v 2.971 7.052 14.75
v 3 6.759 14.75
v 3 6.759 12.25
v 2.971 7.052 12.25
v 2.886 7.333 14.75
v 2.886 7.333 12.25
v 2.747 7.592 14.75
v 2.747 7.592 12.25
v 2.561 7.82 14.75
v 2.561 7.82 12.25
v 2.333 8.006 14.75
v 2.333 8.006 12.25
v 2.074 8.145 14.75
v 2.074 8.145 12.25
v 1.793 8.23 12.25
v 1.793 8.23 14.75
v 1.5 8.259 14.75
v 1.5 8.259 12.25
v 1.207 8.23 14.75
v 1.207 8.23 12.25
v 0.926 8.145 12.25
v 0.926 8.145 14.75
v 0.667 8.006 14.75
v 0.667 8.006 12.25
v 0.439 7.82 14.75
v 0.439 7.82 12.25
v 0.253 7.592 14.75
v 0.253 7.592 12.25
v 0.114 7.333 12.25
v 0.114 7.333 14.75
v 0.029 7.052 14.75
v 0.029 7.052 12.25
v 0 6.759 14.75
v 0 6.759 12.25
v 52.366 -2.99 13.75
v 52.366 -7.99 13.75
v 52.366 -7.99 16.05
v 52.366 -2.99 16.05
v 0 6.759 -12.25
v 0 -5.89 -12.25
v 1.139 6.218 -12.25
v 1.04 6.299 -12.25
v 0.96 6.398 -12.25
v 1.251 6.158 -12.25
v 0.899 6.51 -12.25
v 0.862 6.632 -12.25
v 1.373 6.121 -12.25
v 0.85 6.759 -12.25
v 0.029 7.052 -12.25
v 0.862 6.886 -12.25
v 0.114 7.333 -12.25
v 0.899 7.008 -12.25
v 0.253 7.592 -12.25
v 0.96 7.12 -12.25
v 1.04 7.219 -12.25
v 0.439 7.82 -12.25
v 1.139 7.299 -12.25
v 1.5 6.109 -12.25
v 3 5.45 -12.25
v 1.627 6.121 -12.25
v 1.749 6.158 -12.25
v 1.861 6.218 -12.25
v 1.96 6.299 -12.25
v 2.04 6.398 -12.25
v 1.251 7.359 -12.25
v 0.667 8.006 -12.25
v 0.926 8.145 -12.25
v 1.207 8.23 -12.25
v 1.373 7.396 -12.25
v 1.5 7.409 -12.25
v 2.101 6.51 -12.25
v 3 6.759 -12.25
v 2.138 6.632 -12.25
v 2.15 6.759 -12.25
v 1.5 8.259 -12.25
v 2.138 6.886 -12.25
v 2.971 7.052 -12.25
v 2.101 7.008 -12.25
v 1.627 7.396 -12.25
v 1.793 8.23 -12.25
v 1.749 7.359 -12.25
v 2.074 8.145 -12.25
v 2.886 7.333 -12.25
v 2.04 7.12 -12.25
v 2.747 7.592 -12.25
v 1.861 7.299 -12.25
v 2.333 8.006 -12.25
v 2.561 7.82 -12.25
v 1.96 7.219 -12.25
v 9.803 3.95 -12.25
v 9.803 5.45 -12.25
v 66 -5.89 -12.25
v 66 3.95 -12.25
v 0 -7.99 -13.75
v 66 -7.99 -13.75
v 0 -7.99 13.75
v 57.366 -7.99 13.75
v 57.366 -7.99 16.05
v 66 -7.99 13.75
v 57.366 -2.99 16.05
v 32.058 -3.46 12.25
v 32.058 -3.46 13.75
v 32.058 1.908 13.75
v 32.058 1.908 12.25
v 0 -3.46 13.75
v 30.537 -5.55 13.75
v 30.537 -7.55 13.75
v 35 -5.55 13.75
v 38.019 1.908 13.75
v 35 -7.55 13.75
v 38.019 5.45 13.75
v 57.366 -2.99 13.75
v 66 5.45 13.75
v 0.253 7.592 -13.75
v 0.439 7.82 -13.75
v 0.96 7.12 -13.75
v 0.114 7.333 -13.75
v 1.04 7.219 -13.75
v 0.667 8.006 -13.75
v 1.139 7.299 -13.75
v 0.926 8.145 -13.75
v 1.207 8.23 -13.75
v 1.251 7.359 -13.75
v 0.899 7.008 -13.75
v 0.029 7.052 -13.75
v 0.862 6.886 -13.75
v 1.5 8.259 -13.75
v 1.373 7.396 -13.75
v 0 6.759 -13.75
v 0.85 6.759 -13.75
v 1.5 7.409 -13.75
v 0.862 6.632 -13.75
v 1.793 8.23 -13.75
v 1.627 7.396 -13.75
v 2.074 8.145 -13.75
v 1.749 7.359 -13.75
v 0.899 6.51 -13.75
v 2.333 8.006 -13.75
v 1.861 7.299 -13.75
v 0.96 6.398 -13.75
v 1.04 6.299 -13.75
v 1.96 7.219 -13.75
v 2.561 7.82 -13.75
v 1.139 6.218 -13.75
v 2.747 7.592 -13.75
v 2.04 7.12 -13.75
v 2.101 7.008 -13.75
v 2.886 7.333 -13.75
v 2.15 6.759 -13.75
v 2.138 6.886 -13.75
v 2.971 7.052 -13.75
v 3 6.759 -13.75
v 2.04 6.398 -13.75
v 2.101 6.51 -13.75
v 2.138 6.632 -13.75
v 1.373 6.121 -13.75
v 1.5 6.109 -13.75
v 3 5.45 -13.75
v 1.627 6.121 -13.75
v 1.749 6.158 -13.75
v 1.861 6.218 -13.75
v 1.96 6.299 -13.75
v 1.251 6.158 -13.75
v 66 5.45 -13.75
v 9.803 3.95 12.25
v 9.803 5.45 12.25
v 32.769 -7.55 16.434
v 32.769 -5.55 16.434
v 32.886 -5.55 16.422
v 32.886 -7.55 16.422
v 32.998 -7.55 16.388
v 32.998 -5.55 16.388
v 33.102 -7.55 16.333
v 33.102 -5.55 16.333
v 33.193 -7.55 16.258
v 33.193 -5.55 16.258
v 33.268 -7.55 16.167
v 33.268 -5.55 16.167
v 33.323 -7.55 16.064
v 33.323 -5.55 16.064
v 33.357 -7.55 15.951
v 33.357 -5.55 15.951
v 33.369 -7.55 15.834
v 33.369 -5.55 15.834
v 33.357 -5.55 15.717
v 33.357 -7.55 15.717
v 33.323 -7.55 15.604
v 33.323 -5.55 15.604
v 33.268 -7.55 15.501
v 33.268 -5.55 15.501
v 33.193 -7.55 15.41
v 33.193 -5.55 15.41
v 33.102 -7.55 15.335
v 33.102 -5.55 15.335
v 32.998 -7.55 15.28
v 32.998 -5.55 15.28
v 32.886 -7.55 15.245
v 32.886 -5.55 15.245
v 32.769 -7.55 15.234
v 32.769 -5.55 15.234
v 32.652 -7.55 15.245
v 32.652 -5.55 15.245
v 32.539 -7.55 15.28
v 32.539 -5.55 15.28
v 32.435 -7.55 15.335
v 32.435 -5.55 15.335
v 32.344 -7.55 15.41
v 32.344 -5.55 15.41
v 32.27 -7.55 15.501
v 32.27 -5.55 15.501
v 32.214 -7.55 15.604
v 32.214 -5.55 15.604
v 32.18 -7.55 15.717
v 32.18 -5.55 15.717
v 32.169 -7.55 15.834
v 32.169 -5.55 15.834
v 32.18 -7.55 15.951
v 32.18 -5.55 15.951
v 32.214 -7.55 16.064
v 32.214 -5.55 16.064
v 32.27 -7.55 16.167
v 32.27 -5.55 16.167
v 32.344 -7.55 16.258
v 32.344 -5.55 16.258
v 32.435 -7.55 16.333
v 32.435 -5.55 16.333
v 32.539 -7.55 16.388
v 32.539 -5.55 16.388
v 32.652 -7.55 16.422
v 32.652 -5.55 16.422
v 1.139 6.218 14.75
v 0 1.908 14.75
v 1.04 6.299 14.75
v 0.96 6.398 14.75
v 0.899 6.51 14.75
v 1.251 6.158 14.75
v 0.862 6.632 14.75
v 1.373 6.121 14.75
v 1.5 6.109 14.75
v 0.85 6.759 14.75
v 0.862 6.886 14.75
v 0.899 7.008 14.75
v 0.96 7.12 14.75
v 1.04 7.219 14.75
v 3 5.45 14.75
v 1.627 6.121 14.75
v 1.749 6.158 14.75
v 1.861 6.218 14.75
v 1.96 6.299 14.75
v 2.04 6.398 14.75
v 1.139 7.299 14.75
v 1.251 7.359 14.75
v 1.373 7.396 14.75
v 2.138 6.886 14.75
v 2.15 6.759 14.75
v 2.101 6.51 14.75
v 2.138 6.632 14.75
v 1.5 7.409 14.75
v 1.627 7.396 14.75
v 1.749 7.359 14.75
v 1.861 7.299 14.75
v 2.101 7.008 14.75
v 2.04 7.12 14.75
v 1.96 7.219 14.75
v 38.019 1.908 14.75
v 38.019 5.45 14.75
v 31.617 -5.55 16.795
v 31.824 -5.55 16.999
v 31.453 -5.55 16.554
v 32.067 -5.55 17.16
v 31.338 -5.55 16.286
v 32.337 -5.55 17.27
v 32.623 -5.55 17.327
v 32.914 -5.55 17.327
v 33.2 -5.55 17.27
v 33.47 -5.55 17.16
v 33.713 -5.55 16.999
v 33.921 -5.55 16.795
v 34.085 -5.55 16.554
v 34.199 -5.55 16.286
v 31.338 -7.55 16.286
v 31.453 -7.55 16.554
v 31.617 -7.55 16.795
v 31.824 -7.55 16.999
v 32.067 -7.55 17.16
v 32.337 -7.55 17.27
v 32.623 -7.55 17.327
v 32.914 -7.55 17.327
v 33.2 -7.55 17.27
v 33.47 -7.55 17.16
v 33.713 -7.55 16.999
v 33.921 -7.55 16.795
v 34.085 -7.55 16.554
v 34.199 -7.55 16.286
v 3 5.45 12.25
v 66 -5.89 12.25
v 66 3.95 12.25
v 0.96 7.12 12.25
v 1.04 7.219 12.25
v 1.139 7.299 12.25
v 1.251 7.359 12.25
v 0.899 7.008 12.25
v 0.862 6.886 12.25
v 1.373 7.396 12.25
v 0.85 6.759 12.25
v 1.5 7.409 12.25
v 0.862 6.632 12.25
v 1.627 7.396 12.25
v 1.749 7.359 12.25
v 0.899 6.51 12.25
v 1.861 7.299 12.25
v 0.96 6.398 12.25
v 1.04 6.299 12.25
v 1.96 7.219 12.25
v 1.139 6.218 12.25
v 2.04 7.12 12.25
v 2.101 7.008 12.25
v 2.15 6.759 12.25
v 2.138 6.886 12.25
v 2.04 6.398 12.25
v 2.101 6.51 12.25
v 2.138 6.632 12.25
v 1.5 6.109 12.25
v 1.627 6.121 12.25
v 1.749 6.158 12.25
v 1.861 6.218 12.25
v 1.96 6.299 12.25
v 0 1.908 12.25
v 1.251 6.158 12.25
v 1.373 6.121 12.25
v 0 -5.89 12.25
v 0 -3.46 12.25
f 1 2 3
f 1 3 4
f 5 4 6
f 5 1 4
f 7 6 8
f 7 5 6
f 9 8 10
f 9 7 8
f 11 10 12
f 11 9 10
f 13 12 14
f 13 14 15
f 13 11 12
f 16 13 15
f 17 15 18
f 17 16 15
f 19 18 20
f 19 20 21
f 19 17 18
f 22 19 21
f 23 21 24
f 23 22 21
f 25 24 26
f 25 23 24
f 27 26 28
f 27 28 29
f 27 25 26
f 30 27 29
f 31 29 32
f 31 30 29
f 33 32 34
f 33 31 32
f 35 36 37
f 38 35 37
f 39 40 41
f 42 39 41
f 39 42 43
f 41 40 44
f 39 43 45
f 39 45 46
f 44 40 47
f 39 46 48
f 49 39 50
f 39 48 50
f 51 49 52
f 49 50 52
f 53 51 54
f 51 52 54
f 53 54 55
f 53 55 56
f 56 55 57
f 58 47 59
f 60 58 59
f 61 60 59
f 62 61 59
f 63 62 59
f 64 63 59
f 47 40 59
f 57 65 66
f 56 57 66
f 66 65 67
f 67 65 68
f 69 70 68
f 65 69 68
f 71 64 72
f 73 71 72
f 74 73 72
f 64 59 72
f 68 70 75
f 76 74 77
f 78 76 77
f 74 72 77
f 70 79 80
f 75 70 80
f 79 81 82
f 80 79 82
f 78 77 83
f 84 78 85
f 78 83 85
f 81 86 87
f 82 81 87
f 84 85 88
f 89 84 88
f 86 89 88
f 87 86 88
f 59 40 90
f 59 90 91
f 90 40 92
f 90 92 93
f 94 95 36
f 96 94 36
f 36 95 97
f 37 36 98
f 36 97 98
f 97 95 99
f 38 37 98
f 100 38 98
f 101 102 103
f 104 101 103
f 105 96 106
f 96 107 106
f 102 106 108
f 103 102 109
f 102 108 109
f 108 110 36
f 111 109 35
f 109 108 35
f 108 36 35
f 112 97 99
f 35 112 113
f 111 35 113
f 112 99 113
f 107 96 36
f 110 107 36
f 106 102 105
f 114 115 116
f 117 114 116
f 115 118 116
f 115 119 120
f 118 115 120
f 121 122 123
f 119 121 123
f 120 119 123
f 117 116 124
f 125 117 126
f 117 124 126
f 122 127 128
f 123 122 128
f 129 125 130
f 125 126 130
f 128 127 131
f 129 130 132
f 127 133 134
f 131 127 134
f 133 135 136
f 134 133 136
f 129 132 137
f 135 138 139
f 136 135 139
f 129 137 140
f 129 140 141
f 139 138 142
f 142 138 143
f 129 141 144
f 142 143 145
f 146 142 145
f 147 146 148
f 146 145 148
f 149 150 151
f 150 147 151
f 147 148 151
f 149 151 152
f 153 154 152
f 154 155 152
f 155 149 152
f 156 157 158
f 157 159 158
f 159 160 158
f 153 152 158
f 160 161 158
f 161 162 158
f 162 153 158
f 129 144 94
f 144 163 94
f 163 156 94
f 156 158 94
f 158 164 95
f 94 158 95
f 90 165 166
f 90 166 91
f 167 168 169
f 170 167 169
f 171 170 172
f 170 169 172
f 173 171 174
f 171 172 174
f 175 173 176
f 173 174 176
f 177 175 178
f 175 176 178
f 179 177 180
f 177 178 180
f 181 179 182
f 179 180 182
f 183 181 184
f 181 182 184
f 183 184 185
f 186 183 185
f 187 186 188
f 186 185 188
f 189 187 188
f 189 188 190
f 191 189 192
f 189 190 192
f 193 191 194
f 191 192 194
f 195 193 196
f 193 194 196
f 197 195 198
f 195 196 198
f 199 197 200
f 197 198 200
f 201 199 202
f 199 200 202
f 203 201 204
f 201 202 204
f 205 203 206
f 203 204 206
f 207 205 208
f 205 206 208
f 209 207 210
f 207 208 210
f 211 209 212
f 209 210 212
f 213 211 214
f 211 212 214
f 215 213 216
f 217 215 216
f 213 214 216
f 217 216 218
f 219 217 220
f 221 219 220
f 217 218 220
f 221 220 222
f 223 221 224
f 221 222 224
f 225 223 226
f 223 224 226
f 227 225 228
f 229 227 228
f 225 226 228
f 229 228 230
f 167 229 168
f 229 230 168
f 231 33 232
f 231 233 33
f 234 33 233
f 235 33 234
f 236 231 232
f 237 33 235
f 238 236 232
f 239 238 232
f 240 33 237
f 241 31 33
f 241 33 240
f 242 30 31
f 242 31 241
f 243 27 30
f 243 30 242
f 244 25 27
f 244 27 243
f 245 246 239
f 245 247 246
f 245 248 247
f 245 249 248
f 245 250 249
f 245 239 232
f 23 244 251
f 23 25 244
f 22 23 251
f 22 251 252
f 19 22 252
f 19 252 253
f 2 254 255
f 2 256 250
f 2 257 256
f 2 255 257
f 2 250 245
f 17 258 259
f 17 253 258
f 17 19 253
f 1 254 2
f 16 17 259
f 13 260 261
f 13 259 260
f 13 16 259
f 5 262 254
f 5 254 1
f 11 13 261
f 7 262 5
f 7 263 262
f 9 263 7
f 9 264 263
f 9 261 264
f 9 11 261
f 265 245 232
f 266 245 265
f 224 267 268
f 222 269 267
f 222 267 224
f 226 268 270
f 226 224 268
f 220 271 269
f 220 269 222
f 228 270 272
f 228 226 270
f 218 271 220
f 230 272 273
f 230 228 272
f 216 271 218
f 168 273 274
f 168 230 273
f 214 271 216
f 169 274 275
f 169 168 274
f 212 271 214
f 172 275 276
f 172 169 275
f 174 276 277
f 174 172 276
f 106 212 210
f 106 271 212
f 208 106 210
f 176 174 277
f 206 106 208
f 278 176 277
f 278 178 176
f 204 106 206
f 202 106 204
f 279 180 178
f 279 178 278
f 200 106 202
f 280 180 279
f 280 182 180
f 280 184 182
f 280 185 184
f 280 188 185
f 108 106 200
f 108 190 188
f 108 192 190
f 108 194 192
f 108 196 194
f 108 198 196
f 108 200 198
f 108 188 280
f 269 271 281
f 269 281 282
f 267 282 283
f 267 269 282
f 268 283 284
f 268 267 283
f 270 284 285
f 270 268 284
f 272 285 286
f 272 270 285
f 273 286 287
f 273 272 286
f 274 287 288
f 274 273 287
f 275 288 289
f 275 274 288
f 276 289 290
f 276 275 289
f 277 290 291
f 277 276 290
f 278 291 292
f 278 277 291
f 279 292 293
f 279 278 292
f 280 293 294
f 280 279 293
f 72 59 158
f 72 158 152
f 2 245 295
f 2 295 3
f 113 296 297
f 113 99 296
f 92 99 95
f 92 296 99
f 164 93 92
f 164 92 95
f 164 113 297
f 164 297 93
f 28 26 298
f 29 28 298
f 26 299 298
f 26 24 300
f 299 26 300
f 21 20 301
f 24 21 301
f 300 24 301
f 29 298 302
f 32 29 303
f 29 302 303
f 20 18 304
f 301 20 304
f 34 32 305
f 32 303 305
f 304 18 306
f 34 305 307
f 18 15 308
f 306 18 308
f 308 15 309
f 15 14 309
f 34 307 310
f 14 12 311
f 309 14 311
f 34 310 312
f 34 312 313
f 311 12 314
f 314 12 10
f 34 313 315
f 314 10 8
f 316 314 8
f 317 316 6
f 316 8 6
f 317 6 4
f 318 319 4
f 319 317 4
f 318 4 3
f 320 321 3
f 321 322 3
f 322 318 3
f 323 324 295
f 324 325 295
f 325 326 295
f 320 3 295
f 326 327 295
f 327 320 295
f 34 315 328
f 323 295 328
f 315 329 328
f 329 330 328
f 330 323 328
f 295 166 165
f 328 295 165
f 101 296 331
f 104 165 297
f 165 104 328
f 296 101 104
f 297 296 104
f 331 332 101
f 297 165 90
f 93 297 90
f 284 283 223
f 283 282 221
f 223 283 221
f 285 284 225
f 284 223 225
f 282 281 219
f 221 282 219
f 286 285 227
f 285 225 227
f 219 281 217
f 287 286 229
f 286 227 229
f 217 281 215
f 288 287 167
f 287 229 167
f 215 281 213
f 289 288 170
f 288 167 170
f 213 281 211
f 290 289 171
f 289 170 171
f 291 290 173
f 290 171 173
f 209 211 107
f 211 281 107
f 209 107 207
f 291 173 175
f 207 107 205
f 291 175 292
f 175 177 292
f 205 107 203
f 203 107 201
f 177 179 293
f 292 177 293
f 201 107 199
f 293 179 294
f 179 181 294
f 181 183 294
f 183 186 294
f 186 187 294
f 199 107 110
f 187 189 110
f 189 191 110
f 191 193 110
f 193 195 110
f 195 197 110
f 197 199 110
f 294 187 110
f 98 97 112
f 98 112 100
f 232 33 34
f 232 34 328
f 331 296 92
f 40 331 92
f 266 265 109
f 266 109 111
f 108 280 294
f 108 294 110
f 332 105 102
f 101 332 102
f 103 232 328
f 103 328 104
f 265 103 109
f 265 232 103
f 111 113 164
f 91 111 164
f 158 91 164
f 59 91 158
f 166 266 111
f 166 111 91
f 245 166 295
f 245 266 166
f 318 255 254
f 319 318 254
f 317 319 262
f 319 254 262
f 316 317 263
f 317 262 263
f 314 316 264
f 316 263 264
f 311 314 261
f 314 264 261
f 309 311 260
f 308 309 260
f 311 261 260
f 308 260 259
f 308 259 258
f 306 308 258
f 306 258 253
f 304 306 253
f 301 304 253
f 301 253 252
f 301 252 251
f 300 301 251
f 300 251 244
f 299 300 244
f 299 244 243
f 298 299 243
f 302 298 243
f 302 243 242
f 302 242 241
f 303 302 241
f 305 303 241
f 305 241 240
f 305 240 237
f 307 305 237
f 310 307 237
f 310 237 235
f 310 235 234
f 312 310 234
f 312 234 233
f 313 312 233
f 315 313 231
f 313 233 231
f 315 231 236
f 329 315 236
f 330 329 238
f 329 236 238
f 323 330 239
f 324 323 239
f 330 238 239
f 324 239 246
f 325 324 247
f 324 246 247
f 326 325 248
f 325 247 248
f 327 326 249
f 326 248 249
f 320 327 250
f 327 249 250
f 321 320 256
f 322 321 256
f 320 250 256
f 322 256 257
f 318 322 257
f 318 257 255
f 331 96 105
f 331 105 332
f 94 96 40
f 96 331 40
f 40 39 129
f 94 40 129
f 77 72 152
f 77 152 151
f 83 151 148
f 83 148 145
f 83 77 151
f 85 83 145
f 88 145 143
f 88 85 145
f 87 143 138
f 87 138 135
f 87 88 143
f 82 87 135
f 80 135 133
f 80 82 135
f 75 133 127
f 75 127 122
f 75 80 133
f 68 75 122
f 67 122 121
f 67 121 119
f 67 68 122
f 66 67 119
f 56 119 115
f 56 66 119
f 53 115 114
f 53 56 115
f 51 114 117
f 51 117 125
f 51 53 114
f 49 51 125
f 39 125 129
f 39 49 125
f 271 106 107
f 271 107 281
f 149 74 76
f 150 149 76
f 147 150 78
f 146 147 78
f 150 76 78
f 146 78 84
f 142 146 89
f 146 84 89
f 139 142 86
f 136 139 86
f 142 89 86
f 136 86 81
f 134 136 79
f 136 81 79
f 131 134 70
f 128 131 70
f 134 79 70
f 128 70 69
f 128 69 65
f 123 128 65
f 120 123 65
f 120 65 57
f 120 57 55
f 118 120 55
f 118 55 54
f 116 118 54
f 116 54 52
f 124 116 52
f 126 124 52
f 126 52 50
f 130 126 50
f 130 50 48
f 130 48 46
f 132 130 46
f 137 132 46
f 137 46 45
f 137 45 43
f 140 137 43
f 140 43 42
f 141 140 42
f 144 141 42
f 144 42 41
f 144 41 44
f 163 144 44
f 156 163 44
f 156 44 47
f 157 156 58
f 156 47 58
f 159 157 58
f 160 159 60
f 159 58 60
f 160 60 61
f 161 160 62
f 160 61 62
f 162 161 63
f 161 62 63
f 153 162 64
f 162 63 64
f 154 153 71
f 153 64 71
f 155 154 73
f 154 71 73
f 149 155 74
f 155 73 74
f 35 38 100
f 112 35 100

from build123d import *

# Parameters (mm, degrees)
SKETCH_1_W               = 27.5
SKETCH_1_H               = 10.9
SKETCH_1_W_2             = 24.5
SKETCH_1_H_2             = 7.9
EXTRUDE_1_DEPTH          = 66
SKETCH_3_W               = 141.586461115
SKETCH_3_H               = 11.077241851
CUT_EXTRUDE_1_DEPTH      = 50
SKETCH_4_R               = 0.65
EXTRUDE_2_DEPTH          = 27.5
CUT_EXTRUDE_2_DEPTH      = 10
CUT_EXTRUDE_2_DEPTH_BACK = 10
SKETCH_5_W               = 27.947827097
SKETCH_5_H               = 24.5
EXTRUDE_3_DEPTH          = 66
EXTRUDE_START            = -11
SKETCH_9_R               = 0.6
EXTRUDE_5_DEPTH          = 2
SKETCH_10_W              = 33.442715753
SKETCH_10_H              = 5.368535072
CUT_EXTRUDE_3_DEPTH      = 2.6
SKETCH_11_W              = 5
SKETCH_11_H              = 2.3
EXTRUDE_6_DEPTH          = 5
EXTRUDE_START_2          = 1
SKETCH_12_R              = 0.65
EXTRUDE_7_DEPTH          = 1
SKETCH_13_W              = 24.5
SKETCH_13_H              = 0.6
EXTRUDE_8_DEPTH          = 66


with BuildPart() as part:
    # 草图1 → 凸台-拉伸1 (new body)
    with BuildSketch(Plane(origin=(0, 0, 0), x_dir=(0, 0, -1), z_dir=(1, 0, 0))):
        Rectangle(SKETCH_1_W, SKETCH_1_H)
        Rectangle(SKETCH_1_W_2, SKETCH_1_H_2, mode=Mode.SUBTRACT)
    extrude(amount=EXTRUDE_1_DEPTH)

    # 草图3 → 切除-拉伸1 (cut)
    with BuildSketch(Plane.XY.offset(13.75)):
        with Locations((67.57974516, -5.538620926)):
            Rectangle(SKETCH_3_W, SKETCH_3_H)
    extrude(amount=-CUT_EXTRUDE_1_DEPTH, mode=Mode.SUBTRACT)

    # 草图4 → 凸台-拉伸2 (add)
    with BuildSketch(Plane.XY.offset(13.75)):
        with BuildLine():
            Line((0, 6.758945139), (0, 5.45))
            Line((0, 5.45), (3, 5.45))
            Line((3, 5.45), (3, 6.758945139))
            ThreePointArc((3, 6.758945139), (1.5, 8.258945139), (0, 6.758945139))
        make_face()
        with Locations((1.5, 6.758945139)):
            Circle(SKETCH_4_R, mode=Mode.SUBTRACT)
    extrude(amount=-EXTRUDE_2_DEPTH)

    # 草图5 → 切除-拉伸2 (cut, two sides: drawn at the far end of the back side and taken through both)
    with BuildSketch(Plane(origin=(0, 5.45, 0), x_dir=(1, 0, 0), z_dir=(0, 1, 0)).offset(-CUT_EXTRUDE_2_DEPTH_BACK)):
        with Locations((-4.171370472, 0)):
            Rectangle(SKETCH_5_W, SKETCH_5_H)
    extrude(amount=CUT_EXTRUDE_2_DEPTH + CUT_EXTRUDE_2_DEPTH_BACK, mode=Mode.SUBTRACT)

    # 草图6 → 凸台-拉伸3 (add)
    with BuildSketch(Plane(origin=(66, 0, 0), x_dir=(0, 0, -1), z_dir=(1, 0, 0))):
        Polygon((-12.25, 0), (-12.25, -6.49), (12.25, -6.49), (12.25, 0), (13.75, 0), (13.75, -7.99), (-13.75, -7.99), (-13.75, 0), align=None)
    extrude(amount=-EXTRUDE_3_DEPTH)

    # 草图9 → 凸台-拉伸5 (add)
    with BuildSketch(Plane(origin=(0, 5.45, 0), x_dir=(1, 0, 0), z_dir=(0, 1, 0)).offset(EXTRUDE_START)):
        with BuildLine():
            Line((30.537348743, -13.75), (31.33833812, -16.285728508))
            ThreePointArc((31.33833812, -16.285728508), (32.768674372, -17.333911943), (34.199010623, -16.285728508))
            Line((34.199010623, -16.285728508), (35, -13.75))
            Line((35, -13.75), (30.537348743, -13.75))
        make_face()
        with Locations(Location((32.768674372, -15.833911943, 0), (0, 0, 270))):
            Circle(SKETCH_9_R, mode=Mode.SUBTRACT)
    extrude(amount=-EXTRUDE_5_DEPTH)

    # 草图10 → 切除-拉伸3 (cut)
    with BuildSketch(Plane.XY.offset(13.75)):
        with Locations((15.337072277, -0.775945513)):
            Rectangle(SKETCH_10_W, SKETCH_10_H)
    extrude(amount=-CUT_EXTRUDE_3_DEPTH, mode=Mode.SUBTRACT)

    # 草图11 → 凸台-拉伸6 (add)
    with BuildSketch(Plane.XZ.offset(7.99)):
        with Locations((54.86605626, 14.9)):
            Rectangle(SKETCH_11_W, SKETCH_11_H)
    extrude(amount=-EXTRUDE_6_DEPTH)

    # 草图12 → 凸台-拉伸7 (add)
    with BuildSketch(Plane.XY.offset(13.75).offset(EXTRUDE_START_2)):
        with BuildLine():
            Line((32.058430154, 1.908322023), (38.019129527, 1.908322023))
            Line((38.019129527, 1.908322023), (38.019129527, 5.45))
            Line((38.019129527, 5.45), (3, 5.45))
            Line((3, 5.45), (3, 6.758945139))
            ThreePointArc((3, 6.758945139), (1.5, 8.258945139), (0, 6.758945139))
            Line((0, 6.758945139), (0, 1.908322023))
            Line((0, 1.908322023), (32.058430154, 1.908322023))
        make_face()
        with Locations((1.5, 6.758945139)):
            Circle(SKETCH_12_R, mode=Mode.SUBTRACT)
    extrude(amount=-EXTRUDE_7_DEPTH)

    # 草图13 → 凸台-拉伸8 (add)
    with BuildSketch(Plane(origin=(66, 0, 0), x_dir=(0, 0, -1), z_dir=(1, 0, 0))):
        with Locations((0, -6.19)):
            Rectangle(SKETCH_13_W, SKETCH_13_H)
    extrude(amount=-EXTRUDE_8_DEPTH)


solid = part.part
